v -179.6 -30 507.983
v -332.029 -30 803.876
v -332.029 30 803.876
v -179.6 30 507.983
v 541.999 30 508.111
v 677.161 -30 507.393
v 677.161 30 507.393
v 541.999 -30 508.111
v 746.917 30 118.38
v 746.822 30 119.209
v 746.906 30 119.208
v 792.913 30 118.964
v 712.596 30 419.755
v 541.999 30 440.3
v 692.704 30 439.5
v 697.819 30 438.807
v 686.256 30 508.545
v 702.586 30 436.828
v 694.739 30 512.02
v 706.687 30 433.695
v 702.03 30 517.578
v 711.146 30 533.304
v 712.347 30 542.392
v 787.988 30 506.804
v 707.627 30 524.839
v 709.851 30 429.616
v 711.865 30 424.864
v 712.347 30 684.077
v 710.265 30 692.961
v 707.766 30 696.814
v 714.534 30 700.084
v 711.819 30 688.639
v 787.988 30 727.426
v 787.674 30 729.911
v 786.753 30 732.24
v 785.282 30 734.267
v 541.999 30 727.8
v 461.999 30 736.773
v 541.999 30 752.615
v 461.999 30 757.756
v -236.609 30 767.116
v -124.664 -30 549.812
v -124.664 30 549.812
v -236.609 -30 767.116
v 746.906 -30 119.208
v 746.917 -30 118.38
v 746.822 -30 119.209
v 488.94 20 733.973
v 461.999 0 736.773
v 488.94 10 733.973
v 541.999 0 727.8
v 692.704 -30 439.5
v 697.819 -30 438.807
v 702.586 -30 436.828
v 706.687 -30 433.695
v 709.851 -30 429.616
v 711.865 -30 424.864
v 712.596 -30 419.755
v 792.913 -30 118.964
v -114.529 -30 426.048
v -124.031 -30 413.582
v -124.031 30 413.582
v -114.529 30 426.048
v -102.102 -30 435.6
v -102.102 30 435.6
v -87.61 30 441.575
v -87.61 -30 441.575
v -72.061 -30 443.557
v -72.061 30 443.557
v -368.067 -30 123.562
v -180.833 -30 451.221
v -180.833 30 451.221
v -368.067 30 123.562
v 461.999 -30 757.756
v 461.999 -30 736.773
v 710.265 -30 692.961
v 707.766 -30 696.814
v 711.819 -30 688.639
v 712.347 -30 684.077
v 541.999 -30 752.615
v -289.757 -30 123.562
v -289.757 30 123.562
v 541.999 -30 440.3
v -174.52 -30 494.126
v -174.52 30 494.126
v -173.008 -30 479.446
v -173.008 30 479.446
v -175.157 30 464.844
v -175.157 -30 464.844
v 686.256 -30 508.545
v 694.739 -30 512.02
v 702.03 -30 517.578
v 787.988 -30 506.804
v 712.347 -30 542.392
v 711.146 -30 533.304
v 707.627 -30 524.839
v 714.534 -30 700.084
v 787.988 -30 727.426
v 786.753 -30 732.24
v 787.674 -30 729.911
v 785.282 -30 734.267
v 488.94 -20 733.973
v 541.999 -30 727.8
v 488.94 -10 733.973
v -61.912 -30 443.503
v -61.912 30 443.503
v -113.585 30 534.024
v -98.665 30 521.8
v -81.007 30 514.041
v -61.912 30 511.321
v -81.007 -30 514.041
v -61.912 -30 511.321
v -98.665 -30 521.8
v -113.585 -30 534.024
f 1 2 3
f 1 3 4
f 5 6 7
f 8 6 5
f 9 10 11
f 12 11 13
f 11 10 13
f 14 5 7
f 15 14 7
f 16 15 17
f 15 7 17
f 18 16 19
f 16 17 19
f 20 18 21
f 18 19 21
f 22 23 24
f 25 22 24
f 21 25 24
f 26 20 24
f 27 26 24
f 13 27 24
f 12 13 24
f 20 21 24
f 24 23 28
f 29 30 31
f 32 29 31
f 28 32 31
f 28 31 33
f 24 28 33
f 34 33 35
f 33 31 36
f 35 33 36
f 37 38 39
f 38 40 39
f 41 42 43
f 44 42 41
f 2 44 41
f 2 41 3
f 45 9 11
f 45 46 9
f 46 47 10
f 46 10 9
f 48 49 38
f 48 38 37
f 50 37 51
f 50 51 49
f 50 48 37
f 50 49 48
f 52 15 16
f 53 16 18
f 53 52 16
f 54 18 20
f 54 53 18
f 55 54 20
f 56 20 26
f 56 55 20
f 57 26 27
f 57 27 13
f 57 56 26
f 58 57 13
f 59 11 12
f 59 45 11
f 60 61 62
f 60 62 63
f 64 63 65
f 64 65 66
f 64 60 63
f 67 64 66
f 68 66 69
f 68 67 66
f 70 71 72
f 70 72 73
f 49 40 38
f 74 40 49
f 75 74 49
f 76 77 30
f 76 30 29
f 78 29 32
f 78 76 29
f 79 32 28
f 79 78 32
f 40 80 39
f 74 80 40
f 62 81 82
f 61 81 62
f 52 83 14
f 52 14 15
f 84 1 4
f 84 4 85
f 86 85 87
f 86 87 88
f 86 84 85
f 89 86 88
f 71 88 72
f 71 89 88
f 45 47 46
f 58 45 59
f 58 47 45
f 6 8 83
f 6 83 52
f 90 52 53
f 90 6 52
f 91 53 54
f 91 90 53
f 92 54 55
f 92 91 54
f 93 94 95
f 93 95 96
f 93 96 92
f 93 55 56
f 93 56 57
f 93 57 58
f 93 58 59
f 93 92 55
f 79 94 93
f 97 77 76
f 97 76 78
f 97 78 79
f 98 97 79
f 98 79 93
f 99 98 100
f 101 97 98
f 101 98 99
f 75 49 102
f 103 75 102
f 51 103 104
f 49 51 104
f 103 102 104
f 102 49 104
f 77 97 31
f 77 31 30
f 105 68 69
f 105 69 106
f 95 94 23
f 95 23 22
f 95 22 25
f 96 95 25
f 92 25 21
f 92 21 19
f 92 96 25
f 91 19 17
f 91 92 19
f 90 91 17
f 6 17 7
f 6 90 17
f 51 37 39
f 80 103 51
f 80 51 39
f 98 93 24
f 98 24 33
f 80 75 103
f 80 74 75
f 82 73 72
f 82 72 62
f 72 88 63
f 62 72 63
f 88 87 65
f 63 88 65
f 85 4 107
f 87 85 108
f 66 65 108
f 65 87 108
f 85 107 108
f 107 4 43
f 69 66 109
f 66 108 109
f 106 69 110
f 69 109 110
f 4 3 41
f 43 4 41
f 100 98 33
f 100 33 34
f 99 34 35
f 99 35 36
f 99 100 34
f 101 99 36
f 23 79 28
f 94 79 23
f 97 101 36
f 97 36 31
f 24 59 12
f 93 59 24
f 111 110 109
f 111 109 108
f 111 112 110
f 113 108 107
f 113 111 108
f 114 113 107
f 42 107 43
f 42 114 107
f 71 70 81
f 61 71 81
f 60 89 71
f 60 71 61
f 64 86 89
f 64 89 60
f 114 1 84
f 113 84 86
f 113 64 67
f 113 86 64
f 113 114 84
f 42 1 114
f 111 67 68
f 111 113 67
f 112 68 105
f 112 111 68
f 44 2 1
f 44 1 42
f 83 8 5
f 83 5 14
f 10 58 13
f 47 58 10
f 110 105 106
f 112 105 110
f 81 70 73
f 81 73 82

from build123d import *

# Parameters (mm, degrees)
F1_DEPTH = 30


with BuildPart() as f1:
    # F0 (on Front) → F1 (new body, symmetric)
    with BuildSketch(Plane.XZ):
        with BuildLine():
            Line((792.9128824881, 118.9643679948), (787.9878913216, 506.8038779257))
            Line((787.9878913216, 506.8038779257), (787.9878913216, 683.6658184119))
            add(Edge.make_bspline(
                [(714.5339111446, 700.0838076709), (739.5925972645, 695.0095645709), (764.0533999142, 689.5203425349), (787.9878913215, 683.6658184119)],
                knots=[0.5636173816, 0.5636173816, 0.5636173816, 0.5636173816, 0.6158564512, 0.6158564512, 0.6158564512, 0.6158564512], degree=3))
            Line((714.5339111446, 700.0838076709), (707.766144209, 696.8138969939))
            ThreePointArc((707.766144209, 696.8138969939), (711.16675882, 690.8444986797), (712.3467062191, 684.0765137432))
            Line((712.3467062191, 684.0765137432), (712.3467062191, 542.3923685329))
            ThreePointArc((712.3467062191, 542.3923685329), (702.0295939995, 517.5779563734), (677.1607033152, 507.3928627804))
            Line((677.1607033152, 507.3928627804), (541.9986248016, 508.1111740414))
            Line((541.9986248016, 508.1111740414), (541.9986248016, 477.4119283793))
            Line((541.9986248016, 477.4119283793), (541.9986248016, 440.2998282791))
            Line((541.9986248016, 440.2998282791), (692.7038248536, 439.500422329))
            ThreePointArc((692.7038248536, 439.500422329), (706.6874970919, 433.6950222298), (712.5961253131, 419.7546537941))
            Line((712.5961253131, 419.7546537941), (746.8222238447, 119.2088529014))
            Line((746.8222238447, 119.2088529014), (746.9060652922, 119.2084081699))
            Line((746.9060652922, 119.2084081699), (792.9128824881, 118.9643679948))
        make_face()
        with BuildLine():
            add(Edge.make_bspline(
                [(714.5339111446, 700.0838076709), (739.5925972645, 695.0095645709), (764.0533999142, 689.5203425349), (787.9878913215, 683.6658184119)],
                knots=[0.5636173816, 0.5636173816, 0.5636173816, 0.5636173816, 0.6158564512, 0.6158564512, 0.6158564512, 0.6158564512], degree=3))
            Line((787.9878913216, 683.6658184119), (787.9878913216, 727.4259827856))
            ThreePointArc((787.9878913216, 727.4259827856), (787.2869015502, 731.1040813117), (785.2822095679, 734.2665179489))
            Line((785.2822095679, 734.2665179489), (714.5339111446, 700.0838076709))
        make_face()
        Polygon((746.916581268, 118.3802826414), (746.9060652922, 119.2084081699), (746.8222238447, 119.2088529014), align=None)
    extrude(amount=F1_DEPTH, both=True)


with BuildPart() as f1b:
    # F0 (on Front) → F1, piece 2 (new body, symmetric)
    with BuildSketch(Plane.XZ):
        with BuildLine():
            add(Edge.make_bspline(
                [(461.9986116886, 736.7730380501), (489.0719013944, 734.0640894482), (515.7548604152, 731.0842201394), (541.9986248016, 727.7995146356)],
                knots=[0.3993309236, 0.3993309236, 0.3993309236, 0.3993309236, 0.4493215774, 0.4493215774, 0.4493215774, 0.4493215774], degree=3))
            Line((541.9986248016, 727.7995146356), (541.9986248016, 752.614573807))
            Line((541.9986248016, 752.614573807), (461.9986116886, 757.7564887194))
            Line((461.9986116886, 757.7564887194), (461.9986116886, 736.7730380501))
        make_face()
    extrude(amount=F1_DEPTH, both=True)


with BuildPart() as f1c:
    # F0 (on Front) → F1, piece 3 (new body, symmetric)
    with BuildSketch(Plane.XZ):
        with BuildLine():
            Line((-124.6641682472, 549.8122041474), (-236.6087170305, 767.1163282575))
            Line((-236.6087170305, 767.1163282575), (-332.0290716681, 803.8758623378))
            Line((-332.0290716686, 803.8758623375), (-179.5995307623, 507.9832241058))
            ThreePointArc((-179.5995307623, 507.9832241058), (-173.0083340294, 479.445603769), (-180.8329047313, 451.2212217175))
            Line((-180.8329047313, 451.2212217175), (-368.0669905303, 123.5615715693))
            Line((-368.0669905303, 123.5615715693), (-289.7571332166, 123.5615715693))
            Line((-289.7571332166, 123.5615715693), (-124.031344359, 413.5817020702))
            ThreePointArc((-124.031344359, 413.5817020702), (-102.1015120603, 435.6000196795), (-72.0613854071, 443.5570697393))
            Line((-72.0613854071, 443.5570697393), (-61.9120658447, 443.5032333325))
            Line((-61.9120658447, 443.5032333325), (-61.9120658447, 477.4119283793))
            Line((-61.9120658447, 477.4119283793), (-61.9120658447, 511.3206234261))
            ThreePointArc((-61.9120658447, 511.3206234261), (-98.6652755529, 521.8001330848), (-124.6641682472, 549.8122041474))
        make_face()
    extrude(amount=F1_DEPTH, both=True)


solid = Compound([f1.part, f1b.part, f1c.part])
